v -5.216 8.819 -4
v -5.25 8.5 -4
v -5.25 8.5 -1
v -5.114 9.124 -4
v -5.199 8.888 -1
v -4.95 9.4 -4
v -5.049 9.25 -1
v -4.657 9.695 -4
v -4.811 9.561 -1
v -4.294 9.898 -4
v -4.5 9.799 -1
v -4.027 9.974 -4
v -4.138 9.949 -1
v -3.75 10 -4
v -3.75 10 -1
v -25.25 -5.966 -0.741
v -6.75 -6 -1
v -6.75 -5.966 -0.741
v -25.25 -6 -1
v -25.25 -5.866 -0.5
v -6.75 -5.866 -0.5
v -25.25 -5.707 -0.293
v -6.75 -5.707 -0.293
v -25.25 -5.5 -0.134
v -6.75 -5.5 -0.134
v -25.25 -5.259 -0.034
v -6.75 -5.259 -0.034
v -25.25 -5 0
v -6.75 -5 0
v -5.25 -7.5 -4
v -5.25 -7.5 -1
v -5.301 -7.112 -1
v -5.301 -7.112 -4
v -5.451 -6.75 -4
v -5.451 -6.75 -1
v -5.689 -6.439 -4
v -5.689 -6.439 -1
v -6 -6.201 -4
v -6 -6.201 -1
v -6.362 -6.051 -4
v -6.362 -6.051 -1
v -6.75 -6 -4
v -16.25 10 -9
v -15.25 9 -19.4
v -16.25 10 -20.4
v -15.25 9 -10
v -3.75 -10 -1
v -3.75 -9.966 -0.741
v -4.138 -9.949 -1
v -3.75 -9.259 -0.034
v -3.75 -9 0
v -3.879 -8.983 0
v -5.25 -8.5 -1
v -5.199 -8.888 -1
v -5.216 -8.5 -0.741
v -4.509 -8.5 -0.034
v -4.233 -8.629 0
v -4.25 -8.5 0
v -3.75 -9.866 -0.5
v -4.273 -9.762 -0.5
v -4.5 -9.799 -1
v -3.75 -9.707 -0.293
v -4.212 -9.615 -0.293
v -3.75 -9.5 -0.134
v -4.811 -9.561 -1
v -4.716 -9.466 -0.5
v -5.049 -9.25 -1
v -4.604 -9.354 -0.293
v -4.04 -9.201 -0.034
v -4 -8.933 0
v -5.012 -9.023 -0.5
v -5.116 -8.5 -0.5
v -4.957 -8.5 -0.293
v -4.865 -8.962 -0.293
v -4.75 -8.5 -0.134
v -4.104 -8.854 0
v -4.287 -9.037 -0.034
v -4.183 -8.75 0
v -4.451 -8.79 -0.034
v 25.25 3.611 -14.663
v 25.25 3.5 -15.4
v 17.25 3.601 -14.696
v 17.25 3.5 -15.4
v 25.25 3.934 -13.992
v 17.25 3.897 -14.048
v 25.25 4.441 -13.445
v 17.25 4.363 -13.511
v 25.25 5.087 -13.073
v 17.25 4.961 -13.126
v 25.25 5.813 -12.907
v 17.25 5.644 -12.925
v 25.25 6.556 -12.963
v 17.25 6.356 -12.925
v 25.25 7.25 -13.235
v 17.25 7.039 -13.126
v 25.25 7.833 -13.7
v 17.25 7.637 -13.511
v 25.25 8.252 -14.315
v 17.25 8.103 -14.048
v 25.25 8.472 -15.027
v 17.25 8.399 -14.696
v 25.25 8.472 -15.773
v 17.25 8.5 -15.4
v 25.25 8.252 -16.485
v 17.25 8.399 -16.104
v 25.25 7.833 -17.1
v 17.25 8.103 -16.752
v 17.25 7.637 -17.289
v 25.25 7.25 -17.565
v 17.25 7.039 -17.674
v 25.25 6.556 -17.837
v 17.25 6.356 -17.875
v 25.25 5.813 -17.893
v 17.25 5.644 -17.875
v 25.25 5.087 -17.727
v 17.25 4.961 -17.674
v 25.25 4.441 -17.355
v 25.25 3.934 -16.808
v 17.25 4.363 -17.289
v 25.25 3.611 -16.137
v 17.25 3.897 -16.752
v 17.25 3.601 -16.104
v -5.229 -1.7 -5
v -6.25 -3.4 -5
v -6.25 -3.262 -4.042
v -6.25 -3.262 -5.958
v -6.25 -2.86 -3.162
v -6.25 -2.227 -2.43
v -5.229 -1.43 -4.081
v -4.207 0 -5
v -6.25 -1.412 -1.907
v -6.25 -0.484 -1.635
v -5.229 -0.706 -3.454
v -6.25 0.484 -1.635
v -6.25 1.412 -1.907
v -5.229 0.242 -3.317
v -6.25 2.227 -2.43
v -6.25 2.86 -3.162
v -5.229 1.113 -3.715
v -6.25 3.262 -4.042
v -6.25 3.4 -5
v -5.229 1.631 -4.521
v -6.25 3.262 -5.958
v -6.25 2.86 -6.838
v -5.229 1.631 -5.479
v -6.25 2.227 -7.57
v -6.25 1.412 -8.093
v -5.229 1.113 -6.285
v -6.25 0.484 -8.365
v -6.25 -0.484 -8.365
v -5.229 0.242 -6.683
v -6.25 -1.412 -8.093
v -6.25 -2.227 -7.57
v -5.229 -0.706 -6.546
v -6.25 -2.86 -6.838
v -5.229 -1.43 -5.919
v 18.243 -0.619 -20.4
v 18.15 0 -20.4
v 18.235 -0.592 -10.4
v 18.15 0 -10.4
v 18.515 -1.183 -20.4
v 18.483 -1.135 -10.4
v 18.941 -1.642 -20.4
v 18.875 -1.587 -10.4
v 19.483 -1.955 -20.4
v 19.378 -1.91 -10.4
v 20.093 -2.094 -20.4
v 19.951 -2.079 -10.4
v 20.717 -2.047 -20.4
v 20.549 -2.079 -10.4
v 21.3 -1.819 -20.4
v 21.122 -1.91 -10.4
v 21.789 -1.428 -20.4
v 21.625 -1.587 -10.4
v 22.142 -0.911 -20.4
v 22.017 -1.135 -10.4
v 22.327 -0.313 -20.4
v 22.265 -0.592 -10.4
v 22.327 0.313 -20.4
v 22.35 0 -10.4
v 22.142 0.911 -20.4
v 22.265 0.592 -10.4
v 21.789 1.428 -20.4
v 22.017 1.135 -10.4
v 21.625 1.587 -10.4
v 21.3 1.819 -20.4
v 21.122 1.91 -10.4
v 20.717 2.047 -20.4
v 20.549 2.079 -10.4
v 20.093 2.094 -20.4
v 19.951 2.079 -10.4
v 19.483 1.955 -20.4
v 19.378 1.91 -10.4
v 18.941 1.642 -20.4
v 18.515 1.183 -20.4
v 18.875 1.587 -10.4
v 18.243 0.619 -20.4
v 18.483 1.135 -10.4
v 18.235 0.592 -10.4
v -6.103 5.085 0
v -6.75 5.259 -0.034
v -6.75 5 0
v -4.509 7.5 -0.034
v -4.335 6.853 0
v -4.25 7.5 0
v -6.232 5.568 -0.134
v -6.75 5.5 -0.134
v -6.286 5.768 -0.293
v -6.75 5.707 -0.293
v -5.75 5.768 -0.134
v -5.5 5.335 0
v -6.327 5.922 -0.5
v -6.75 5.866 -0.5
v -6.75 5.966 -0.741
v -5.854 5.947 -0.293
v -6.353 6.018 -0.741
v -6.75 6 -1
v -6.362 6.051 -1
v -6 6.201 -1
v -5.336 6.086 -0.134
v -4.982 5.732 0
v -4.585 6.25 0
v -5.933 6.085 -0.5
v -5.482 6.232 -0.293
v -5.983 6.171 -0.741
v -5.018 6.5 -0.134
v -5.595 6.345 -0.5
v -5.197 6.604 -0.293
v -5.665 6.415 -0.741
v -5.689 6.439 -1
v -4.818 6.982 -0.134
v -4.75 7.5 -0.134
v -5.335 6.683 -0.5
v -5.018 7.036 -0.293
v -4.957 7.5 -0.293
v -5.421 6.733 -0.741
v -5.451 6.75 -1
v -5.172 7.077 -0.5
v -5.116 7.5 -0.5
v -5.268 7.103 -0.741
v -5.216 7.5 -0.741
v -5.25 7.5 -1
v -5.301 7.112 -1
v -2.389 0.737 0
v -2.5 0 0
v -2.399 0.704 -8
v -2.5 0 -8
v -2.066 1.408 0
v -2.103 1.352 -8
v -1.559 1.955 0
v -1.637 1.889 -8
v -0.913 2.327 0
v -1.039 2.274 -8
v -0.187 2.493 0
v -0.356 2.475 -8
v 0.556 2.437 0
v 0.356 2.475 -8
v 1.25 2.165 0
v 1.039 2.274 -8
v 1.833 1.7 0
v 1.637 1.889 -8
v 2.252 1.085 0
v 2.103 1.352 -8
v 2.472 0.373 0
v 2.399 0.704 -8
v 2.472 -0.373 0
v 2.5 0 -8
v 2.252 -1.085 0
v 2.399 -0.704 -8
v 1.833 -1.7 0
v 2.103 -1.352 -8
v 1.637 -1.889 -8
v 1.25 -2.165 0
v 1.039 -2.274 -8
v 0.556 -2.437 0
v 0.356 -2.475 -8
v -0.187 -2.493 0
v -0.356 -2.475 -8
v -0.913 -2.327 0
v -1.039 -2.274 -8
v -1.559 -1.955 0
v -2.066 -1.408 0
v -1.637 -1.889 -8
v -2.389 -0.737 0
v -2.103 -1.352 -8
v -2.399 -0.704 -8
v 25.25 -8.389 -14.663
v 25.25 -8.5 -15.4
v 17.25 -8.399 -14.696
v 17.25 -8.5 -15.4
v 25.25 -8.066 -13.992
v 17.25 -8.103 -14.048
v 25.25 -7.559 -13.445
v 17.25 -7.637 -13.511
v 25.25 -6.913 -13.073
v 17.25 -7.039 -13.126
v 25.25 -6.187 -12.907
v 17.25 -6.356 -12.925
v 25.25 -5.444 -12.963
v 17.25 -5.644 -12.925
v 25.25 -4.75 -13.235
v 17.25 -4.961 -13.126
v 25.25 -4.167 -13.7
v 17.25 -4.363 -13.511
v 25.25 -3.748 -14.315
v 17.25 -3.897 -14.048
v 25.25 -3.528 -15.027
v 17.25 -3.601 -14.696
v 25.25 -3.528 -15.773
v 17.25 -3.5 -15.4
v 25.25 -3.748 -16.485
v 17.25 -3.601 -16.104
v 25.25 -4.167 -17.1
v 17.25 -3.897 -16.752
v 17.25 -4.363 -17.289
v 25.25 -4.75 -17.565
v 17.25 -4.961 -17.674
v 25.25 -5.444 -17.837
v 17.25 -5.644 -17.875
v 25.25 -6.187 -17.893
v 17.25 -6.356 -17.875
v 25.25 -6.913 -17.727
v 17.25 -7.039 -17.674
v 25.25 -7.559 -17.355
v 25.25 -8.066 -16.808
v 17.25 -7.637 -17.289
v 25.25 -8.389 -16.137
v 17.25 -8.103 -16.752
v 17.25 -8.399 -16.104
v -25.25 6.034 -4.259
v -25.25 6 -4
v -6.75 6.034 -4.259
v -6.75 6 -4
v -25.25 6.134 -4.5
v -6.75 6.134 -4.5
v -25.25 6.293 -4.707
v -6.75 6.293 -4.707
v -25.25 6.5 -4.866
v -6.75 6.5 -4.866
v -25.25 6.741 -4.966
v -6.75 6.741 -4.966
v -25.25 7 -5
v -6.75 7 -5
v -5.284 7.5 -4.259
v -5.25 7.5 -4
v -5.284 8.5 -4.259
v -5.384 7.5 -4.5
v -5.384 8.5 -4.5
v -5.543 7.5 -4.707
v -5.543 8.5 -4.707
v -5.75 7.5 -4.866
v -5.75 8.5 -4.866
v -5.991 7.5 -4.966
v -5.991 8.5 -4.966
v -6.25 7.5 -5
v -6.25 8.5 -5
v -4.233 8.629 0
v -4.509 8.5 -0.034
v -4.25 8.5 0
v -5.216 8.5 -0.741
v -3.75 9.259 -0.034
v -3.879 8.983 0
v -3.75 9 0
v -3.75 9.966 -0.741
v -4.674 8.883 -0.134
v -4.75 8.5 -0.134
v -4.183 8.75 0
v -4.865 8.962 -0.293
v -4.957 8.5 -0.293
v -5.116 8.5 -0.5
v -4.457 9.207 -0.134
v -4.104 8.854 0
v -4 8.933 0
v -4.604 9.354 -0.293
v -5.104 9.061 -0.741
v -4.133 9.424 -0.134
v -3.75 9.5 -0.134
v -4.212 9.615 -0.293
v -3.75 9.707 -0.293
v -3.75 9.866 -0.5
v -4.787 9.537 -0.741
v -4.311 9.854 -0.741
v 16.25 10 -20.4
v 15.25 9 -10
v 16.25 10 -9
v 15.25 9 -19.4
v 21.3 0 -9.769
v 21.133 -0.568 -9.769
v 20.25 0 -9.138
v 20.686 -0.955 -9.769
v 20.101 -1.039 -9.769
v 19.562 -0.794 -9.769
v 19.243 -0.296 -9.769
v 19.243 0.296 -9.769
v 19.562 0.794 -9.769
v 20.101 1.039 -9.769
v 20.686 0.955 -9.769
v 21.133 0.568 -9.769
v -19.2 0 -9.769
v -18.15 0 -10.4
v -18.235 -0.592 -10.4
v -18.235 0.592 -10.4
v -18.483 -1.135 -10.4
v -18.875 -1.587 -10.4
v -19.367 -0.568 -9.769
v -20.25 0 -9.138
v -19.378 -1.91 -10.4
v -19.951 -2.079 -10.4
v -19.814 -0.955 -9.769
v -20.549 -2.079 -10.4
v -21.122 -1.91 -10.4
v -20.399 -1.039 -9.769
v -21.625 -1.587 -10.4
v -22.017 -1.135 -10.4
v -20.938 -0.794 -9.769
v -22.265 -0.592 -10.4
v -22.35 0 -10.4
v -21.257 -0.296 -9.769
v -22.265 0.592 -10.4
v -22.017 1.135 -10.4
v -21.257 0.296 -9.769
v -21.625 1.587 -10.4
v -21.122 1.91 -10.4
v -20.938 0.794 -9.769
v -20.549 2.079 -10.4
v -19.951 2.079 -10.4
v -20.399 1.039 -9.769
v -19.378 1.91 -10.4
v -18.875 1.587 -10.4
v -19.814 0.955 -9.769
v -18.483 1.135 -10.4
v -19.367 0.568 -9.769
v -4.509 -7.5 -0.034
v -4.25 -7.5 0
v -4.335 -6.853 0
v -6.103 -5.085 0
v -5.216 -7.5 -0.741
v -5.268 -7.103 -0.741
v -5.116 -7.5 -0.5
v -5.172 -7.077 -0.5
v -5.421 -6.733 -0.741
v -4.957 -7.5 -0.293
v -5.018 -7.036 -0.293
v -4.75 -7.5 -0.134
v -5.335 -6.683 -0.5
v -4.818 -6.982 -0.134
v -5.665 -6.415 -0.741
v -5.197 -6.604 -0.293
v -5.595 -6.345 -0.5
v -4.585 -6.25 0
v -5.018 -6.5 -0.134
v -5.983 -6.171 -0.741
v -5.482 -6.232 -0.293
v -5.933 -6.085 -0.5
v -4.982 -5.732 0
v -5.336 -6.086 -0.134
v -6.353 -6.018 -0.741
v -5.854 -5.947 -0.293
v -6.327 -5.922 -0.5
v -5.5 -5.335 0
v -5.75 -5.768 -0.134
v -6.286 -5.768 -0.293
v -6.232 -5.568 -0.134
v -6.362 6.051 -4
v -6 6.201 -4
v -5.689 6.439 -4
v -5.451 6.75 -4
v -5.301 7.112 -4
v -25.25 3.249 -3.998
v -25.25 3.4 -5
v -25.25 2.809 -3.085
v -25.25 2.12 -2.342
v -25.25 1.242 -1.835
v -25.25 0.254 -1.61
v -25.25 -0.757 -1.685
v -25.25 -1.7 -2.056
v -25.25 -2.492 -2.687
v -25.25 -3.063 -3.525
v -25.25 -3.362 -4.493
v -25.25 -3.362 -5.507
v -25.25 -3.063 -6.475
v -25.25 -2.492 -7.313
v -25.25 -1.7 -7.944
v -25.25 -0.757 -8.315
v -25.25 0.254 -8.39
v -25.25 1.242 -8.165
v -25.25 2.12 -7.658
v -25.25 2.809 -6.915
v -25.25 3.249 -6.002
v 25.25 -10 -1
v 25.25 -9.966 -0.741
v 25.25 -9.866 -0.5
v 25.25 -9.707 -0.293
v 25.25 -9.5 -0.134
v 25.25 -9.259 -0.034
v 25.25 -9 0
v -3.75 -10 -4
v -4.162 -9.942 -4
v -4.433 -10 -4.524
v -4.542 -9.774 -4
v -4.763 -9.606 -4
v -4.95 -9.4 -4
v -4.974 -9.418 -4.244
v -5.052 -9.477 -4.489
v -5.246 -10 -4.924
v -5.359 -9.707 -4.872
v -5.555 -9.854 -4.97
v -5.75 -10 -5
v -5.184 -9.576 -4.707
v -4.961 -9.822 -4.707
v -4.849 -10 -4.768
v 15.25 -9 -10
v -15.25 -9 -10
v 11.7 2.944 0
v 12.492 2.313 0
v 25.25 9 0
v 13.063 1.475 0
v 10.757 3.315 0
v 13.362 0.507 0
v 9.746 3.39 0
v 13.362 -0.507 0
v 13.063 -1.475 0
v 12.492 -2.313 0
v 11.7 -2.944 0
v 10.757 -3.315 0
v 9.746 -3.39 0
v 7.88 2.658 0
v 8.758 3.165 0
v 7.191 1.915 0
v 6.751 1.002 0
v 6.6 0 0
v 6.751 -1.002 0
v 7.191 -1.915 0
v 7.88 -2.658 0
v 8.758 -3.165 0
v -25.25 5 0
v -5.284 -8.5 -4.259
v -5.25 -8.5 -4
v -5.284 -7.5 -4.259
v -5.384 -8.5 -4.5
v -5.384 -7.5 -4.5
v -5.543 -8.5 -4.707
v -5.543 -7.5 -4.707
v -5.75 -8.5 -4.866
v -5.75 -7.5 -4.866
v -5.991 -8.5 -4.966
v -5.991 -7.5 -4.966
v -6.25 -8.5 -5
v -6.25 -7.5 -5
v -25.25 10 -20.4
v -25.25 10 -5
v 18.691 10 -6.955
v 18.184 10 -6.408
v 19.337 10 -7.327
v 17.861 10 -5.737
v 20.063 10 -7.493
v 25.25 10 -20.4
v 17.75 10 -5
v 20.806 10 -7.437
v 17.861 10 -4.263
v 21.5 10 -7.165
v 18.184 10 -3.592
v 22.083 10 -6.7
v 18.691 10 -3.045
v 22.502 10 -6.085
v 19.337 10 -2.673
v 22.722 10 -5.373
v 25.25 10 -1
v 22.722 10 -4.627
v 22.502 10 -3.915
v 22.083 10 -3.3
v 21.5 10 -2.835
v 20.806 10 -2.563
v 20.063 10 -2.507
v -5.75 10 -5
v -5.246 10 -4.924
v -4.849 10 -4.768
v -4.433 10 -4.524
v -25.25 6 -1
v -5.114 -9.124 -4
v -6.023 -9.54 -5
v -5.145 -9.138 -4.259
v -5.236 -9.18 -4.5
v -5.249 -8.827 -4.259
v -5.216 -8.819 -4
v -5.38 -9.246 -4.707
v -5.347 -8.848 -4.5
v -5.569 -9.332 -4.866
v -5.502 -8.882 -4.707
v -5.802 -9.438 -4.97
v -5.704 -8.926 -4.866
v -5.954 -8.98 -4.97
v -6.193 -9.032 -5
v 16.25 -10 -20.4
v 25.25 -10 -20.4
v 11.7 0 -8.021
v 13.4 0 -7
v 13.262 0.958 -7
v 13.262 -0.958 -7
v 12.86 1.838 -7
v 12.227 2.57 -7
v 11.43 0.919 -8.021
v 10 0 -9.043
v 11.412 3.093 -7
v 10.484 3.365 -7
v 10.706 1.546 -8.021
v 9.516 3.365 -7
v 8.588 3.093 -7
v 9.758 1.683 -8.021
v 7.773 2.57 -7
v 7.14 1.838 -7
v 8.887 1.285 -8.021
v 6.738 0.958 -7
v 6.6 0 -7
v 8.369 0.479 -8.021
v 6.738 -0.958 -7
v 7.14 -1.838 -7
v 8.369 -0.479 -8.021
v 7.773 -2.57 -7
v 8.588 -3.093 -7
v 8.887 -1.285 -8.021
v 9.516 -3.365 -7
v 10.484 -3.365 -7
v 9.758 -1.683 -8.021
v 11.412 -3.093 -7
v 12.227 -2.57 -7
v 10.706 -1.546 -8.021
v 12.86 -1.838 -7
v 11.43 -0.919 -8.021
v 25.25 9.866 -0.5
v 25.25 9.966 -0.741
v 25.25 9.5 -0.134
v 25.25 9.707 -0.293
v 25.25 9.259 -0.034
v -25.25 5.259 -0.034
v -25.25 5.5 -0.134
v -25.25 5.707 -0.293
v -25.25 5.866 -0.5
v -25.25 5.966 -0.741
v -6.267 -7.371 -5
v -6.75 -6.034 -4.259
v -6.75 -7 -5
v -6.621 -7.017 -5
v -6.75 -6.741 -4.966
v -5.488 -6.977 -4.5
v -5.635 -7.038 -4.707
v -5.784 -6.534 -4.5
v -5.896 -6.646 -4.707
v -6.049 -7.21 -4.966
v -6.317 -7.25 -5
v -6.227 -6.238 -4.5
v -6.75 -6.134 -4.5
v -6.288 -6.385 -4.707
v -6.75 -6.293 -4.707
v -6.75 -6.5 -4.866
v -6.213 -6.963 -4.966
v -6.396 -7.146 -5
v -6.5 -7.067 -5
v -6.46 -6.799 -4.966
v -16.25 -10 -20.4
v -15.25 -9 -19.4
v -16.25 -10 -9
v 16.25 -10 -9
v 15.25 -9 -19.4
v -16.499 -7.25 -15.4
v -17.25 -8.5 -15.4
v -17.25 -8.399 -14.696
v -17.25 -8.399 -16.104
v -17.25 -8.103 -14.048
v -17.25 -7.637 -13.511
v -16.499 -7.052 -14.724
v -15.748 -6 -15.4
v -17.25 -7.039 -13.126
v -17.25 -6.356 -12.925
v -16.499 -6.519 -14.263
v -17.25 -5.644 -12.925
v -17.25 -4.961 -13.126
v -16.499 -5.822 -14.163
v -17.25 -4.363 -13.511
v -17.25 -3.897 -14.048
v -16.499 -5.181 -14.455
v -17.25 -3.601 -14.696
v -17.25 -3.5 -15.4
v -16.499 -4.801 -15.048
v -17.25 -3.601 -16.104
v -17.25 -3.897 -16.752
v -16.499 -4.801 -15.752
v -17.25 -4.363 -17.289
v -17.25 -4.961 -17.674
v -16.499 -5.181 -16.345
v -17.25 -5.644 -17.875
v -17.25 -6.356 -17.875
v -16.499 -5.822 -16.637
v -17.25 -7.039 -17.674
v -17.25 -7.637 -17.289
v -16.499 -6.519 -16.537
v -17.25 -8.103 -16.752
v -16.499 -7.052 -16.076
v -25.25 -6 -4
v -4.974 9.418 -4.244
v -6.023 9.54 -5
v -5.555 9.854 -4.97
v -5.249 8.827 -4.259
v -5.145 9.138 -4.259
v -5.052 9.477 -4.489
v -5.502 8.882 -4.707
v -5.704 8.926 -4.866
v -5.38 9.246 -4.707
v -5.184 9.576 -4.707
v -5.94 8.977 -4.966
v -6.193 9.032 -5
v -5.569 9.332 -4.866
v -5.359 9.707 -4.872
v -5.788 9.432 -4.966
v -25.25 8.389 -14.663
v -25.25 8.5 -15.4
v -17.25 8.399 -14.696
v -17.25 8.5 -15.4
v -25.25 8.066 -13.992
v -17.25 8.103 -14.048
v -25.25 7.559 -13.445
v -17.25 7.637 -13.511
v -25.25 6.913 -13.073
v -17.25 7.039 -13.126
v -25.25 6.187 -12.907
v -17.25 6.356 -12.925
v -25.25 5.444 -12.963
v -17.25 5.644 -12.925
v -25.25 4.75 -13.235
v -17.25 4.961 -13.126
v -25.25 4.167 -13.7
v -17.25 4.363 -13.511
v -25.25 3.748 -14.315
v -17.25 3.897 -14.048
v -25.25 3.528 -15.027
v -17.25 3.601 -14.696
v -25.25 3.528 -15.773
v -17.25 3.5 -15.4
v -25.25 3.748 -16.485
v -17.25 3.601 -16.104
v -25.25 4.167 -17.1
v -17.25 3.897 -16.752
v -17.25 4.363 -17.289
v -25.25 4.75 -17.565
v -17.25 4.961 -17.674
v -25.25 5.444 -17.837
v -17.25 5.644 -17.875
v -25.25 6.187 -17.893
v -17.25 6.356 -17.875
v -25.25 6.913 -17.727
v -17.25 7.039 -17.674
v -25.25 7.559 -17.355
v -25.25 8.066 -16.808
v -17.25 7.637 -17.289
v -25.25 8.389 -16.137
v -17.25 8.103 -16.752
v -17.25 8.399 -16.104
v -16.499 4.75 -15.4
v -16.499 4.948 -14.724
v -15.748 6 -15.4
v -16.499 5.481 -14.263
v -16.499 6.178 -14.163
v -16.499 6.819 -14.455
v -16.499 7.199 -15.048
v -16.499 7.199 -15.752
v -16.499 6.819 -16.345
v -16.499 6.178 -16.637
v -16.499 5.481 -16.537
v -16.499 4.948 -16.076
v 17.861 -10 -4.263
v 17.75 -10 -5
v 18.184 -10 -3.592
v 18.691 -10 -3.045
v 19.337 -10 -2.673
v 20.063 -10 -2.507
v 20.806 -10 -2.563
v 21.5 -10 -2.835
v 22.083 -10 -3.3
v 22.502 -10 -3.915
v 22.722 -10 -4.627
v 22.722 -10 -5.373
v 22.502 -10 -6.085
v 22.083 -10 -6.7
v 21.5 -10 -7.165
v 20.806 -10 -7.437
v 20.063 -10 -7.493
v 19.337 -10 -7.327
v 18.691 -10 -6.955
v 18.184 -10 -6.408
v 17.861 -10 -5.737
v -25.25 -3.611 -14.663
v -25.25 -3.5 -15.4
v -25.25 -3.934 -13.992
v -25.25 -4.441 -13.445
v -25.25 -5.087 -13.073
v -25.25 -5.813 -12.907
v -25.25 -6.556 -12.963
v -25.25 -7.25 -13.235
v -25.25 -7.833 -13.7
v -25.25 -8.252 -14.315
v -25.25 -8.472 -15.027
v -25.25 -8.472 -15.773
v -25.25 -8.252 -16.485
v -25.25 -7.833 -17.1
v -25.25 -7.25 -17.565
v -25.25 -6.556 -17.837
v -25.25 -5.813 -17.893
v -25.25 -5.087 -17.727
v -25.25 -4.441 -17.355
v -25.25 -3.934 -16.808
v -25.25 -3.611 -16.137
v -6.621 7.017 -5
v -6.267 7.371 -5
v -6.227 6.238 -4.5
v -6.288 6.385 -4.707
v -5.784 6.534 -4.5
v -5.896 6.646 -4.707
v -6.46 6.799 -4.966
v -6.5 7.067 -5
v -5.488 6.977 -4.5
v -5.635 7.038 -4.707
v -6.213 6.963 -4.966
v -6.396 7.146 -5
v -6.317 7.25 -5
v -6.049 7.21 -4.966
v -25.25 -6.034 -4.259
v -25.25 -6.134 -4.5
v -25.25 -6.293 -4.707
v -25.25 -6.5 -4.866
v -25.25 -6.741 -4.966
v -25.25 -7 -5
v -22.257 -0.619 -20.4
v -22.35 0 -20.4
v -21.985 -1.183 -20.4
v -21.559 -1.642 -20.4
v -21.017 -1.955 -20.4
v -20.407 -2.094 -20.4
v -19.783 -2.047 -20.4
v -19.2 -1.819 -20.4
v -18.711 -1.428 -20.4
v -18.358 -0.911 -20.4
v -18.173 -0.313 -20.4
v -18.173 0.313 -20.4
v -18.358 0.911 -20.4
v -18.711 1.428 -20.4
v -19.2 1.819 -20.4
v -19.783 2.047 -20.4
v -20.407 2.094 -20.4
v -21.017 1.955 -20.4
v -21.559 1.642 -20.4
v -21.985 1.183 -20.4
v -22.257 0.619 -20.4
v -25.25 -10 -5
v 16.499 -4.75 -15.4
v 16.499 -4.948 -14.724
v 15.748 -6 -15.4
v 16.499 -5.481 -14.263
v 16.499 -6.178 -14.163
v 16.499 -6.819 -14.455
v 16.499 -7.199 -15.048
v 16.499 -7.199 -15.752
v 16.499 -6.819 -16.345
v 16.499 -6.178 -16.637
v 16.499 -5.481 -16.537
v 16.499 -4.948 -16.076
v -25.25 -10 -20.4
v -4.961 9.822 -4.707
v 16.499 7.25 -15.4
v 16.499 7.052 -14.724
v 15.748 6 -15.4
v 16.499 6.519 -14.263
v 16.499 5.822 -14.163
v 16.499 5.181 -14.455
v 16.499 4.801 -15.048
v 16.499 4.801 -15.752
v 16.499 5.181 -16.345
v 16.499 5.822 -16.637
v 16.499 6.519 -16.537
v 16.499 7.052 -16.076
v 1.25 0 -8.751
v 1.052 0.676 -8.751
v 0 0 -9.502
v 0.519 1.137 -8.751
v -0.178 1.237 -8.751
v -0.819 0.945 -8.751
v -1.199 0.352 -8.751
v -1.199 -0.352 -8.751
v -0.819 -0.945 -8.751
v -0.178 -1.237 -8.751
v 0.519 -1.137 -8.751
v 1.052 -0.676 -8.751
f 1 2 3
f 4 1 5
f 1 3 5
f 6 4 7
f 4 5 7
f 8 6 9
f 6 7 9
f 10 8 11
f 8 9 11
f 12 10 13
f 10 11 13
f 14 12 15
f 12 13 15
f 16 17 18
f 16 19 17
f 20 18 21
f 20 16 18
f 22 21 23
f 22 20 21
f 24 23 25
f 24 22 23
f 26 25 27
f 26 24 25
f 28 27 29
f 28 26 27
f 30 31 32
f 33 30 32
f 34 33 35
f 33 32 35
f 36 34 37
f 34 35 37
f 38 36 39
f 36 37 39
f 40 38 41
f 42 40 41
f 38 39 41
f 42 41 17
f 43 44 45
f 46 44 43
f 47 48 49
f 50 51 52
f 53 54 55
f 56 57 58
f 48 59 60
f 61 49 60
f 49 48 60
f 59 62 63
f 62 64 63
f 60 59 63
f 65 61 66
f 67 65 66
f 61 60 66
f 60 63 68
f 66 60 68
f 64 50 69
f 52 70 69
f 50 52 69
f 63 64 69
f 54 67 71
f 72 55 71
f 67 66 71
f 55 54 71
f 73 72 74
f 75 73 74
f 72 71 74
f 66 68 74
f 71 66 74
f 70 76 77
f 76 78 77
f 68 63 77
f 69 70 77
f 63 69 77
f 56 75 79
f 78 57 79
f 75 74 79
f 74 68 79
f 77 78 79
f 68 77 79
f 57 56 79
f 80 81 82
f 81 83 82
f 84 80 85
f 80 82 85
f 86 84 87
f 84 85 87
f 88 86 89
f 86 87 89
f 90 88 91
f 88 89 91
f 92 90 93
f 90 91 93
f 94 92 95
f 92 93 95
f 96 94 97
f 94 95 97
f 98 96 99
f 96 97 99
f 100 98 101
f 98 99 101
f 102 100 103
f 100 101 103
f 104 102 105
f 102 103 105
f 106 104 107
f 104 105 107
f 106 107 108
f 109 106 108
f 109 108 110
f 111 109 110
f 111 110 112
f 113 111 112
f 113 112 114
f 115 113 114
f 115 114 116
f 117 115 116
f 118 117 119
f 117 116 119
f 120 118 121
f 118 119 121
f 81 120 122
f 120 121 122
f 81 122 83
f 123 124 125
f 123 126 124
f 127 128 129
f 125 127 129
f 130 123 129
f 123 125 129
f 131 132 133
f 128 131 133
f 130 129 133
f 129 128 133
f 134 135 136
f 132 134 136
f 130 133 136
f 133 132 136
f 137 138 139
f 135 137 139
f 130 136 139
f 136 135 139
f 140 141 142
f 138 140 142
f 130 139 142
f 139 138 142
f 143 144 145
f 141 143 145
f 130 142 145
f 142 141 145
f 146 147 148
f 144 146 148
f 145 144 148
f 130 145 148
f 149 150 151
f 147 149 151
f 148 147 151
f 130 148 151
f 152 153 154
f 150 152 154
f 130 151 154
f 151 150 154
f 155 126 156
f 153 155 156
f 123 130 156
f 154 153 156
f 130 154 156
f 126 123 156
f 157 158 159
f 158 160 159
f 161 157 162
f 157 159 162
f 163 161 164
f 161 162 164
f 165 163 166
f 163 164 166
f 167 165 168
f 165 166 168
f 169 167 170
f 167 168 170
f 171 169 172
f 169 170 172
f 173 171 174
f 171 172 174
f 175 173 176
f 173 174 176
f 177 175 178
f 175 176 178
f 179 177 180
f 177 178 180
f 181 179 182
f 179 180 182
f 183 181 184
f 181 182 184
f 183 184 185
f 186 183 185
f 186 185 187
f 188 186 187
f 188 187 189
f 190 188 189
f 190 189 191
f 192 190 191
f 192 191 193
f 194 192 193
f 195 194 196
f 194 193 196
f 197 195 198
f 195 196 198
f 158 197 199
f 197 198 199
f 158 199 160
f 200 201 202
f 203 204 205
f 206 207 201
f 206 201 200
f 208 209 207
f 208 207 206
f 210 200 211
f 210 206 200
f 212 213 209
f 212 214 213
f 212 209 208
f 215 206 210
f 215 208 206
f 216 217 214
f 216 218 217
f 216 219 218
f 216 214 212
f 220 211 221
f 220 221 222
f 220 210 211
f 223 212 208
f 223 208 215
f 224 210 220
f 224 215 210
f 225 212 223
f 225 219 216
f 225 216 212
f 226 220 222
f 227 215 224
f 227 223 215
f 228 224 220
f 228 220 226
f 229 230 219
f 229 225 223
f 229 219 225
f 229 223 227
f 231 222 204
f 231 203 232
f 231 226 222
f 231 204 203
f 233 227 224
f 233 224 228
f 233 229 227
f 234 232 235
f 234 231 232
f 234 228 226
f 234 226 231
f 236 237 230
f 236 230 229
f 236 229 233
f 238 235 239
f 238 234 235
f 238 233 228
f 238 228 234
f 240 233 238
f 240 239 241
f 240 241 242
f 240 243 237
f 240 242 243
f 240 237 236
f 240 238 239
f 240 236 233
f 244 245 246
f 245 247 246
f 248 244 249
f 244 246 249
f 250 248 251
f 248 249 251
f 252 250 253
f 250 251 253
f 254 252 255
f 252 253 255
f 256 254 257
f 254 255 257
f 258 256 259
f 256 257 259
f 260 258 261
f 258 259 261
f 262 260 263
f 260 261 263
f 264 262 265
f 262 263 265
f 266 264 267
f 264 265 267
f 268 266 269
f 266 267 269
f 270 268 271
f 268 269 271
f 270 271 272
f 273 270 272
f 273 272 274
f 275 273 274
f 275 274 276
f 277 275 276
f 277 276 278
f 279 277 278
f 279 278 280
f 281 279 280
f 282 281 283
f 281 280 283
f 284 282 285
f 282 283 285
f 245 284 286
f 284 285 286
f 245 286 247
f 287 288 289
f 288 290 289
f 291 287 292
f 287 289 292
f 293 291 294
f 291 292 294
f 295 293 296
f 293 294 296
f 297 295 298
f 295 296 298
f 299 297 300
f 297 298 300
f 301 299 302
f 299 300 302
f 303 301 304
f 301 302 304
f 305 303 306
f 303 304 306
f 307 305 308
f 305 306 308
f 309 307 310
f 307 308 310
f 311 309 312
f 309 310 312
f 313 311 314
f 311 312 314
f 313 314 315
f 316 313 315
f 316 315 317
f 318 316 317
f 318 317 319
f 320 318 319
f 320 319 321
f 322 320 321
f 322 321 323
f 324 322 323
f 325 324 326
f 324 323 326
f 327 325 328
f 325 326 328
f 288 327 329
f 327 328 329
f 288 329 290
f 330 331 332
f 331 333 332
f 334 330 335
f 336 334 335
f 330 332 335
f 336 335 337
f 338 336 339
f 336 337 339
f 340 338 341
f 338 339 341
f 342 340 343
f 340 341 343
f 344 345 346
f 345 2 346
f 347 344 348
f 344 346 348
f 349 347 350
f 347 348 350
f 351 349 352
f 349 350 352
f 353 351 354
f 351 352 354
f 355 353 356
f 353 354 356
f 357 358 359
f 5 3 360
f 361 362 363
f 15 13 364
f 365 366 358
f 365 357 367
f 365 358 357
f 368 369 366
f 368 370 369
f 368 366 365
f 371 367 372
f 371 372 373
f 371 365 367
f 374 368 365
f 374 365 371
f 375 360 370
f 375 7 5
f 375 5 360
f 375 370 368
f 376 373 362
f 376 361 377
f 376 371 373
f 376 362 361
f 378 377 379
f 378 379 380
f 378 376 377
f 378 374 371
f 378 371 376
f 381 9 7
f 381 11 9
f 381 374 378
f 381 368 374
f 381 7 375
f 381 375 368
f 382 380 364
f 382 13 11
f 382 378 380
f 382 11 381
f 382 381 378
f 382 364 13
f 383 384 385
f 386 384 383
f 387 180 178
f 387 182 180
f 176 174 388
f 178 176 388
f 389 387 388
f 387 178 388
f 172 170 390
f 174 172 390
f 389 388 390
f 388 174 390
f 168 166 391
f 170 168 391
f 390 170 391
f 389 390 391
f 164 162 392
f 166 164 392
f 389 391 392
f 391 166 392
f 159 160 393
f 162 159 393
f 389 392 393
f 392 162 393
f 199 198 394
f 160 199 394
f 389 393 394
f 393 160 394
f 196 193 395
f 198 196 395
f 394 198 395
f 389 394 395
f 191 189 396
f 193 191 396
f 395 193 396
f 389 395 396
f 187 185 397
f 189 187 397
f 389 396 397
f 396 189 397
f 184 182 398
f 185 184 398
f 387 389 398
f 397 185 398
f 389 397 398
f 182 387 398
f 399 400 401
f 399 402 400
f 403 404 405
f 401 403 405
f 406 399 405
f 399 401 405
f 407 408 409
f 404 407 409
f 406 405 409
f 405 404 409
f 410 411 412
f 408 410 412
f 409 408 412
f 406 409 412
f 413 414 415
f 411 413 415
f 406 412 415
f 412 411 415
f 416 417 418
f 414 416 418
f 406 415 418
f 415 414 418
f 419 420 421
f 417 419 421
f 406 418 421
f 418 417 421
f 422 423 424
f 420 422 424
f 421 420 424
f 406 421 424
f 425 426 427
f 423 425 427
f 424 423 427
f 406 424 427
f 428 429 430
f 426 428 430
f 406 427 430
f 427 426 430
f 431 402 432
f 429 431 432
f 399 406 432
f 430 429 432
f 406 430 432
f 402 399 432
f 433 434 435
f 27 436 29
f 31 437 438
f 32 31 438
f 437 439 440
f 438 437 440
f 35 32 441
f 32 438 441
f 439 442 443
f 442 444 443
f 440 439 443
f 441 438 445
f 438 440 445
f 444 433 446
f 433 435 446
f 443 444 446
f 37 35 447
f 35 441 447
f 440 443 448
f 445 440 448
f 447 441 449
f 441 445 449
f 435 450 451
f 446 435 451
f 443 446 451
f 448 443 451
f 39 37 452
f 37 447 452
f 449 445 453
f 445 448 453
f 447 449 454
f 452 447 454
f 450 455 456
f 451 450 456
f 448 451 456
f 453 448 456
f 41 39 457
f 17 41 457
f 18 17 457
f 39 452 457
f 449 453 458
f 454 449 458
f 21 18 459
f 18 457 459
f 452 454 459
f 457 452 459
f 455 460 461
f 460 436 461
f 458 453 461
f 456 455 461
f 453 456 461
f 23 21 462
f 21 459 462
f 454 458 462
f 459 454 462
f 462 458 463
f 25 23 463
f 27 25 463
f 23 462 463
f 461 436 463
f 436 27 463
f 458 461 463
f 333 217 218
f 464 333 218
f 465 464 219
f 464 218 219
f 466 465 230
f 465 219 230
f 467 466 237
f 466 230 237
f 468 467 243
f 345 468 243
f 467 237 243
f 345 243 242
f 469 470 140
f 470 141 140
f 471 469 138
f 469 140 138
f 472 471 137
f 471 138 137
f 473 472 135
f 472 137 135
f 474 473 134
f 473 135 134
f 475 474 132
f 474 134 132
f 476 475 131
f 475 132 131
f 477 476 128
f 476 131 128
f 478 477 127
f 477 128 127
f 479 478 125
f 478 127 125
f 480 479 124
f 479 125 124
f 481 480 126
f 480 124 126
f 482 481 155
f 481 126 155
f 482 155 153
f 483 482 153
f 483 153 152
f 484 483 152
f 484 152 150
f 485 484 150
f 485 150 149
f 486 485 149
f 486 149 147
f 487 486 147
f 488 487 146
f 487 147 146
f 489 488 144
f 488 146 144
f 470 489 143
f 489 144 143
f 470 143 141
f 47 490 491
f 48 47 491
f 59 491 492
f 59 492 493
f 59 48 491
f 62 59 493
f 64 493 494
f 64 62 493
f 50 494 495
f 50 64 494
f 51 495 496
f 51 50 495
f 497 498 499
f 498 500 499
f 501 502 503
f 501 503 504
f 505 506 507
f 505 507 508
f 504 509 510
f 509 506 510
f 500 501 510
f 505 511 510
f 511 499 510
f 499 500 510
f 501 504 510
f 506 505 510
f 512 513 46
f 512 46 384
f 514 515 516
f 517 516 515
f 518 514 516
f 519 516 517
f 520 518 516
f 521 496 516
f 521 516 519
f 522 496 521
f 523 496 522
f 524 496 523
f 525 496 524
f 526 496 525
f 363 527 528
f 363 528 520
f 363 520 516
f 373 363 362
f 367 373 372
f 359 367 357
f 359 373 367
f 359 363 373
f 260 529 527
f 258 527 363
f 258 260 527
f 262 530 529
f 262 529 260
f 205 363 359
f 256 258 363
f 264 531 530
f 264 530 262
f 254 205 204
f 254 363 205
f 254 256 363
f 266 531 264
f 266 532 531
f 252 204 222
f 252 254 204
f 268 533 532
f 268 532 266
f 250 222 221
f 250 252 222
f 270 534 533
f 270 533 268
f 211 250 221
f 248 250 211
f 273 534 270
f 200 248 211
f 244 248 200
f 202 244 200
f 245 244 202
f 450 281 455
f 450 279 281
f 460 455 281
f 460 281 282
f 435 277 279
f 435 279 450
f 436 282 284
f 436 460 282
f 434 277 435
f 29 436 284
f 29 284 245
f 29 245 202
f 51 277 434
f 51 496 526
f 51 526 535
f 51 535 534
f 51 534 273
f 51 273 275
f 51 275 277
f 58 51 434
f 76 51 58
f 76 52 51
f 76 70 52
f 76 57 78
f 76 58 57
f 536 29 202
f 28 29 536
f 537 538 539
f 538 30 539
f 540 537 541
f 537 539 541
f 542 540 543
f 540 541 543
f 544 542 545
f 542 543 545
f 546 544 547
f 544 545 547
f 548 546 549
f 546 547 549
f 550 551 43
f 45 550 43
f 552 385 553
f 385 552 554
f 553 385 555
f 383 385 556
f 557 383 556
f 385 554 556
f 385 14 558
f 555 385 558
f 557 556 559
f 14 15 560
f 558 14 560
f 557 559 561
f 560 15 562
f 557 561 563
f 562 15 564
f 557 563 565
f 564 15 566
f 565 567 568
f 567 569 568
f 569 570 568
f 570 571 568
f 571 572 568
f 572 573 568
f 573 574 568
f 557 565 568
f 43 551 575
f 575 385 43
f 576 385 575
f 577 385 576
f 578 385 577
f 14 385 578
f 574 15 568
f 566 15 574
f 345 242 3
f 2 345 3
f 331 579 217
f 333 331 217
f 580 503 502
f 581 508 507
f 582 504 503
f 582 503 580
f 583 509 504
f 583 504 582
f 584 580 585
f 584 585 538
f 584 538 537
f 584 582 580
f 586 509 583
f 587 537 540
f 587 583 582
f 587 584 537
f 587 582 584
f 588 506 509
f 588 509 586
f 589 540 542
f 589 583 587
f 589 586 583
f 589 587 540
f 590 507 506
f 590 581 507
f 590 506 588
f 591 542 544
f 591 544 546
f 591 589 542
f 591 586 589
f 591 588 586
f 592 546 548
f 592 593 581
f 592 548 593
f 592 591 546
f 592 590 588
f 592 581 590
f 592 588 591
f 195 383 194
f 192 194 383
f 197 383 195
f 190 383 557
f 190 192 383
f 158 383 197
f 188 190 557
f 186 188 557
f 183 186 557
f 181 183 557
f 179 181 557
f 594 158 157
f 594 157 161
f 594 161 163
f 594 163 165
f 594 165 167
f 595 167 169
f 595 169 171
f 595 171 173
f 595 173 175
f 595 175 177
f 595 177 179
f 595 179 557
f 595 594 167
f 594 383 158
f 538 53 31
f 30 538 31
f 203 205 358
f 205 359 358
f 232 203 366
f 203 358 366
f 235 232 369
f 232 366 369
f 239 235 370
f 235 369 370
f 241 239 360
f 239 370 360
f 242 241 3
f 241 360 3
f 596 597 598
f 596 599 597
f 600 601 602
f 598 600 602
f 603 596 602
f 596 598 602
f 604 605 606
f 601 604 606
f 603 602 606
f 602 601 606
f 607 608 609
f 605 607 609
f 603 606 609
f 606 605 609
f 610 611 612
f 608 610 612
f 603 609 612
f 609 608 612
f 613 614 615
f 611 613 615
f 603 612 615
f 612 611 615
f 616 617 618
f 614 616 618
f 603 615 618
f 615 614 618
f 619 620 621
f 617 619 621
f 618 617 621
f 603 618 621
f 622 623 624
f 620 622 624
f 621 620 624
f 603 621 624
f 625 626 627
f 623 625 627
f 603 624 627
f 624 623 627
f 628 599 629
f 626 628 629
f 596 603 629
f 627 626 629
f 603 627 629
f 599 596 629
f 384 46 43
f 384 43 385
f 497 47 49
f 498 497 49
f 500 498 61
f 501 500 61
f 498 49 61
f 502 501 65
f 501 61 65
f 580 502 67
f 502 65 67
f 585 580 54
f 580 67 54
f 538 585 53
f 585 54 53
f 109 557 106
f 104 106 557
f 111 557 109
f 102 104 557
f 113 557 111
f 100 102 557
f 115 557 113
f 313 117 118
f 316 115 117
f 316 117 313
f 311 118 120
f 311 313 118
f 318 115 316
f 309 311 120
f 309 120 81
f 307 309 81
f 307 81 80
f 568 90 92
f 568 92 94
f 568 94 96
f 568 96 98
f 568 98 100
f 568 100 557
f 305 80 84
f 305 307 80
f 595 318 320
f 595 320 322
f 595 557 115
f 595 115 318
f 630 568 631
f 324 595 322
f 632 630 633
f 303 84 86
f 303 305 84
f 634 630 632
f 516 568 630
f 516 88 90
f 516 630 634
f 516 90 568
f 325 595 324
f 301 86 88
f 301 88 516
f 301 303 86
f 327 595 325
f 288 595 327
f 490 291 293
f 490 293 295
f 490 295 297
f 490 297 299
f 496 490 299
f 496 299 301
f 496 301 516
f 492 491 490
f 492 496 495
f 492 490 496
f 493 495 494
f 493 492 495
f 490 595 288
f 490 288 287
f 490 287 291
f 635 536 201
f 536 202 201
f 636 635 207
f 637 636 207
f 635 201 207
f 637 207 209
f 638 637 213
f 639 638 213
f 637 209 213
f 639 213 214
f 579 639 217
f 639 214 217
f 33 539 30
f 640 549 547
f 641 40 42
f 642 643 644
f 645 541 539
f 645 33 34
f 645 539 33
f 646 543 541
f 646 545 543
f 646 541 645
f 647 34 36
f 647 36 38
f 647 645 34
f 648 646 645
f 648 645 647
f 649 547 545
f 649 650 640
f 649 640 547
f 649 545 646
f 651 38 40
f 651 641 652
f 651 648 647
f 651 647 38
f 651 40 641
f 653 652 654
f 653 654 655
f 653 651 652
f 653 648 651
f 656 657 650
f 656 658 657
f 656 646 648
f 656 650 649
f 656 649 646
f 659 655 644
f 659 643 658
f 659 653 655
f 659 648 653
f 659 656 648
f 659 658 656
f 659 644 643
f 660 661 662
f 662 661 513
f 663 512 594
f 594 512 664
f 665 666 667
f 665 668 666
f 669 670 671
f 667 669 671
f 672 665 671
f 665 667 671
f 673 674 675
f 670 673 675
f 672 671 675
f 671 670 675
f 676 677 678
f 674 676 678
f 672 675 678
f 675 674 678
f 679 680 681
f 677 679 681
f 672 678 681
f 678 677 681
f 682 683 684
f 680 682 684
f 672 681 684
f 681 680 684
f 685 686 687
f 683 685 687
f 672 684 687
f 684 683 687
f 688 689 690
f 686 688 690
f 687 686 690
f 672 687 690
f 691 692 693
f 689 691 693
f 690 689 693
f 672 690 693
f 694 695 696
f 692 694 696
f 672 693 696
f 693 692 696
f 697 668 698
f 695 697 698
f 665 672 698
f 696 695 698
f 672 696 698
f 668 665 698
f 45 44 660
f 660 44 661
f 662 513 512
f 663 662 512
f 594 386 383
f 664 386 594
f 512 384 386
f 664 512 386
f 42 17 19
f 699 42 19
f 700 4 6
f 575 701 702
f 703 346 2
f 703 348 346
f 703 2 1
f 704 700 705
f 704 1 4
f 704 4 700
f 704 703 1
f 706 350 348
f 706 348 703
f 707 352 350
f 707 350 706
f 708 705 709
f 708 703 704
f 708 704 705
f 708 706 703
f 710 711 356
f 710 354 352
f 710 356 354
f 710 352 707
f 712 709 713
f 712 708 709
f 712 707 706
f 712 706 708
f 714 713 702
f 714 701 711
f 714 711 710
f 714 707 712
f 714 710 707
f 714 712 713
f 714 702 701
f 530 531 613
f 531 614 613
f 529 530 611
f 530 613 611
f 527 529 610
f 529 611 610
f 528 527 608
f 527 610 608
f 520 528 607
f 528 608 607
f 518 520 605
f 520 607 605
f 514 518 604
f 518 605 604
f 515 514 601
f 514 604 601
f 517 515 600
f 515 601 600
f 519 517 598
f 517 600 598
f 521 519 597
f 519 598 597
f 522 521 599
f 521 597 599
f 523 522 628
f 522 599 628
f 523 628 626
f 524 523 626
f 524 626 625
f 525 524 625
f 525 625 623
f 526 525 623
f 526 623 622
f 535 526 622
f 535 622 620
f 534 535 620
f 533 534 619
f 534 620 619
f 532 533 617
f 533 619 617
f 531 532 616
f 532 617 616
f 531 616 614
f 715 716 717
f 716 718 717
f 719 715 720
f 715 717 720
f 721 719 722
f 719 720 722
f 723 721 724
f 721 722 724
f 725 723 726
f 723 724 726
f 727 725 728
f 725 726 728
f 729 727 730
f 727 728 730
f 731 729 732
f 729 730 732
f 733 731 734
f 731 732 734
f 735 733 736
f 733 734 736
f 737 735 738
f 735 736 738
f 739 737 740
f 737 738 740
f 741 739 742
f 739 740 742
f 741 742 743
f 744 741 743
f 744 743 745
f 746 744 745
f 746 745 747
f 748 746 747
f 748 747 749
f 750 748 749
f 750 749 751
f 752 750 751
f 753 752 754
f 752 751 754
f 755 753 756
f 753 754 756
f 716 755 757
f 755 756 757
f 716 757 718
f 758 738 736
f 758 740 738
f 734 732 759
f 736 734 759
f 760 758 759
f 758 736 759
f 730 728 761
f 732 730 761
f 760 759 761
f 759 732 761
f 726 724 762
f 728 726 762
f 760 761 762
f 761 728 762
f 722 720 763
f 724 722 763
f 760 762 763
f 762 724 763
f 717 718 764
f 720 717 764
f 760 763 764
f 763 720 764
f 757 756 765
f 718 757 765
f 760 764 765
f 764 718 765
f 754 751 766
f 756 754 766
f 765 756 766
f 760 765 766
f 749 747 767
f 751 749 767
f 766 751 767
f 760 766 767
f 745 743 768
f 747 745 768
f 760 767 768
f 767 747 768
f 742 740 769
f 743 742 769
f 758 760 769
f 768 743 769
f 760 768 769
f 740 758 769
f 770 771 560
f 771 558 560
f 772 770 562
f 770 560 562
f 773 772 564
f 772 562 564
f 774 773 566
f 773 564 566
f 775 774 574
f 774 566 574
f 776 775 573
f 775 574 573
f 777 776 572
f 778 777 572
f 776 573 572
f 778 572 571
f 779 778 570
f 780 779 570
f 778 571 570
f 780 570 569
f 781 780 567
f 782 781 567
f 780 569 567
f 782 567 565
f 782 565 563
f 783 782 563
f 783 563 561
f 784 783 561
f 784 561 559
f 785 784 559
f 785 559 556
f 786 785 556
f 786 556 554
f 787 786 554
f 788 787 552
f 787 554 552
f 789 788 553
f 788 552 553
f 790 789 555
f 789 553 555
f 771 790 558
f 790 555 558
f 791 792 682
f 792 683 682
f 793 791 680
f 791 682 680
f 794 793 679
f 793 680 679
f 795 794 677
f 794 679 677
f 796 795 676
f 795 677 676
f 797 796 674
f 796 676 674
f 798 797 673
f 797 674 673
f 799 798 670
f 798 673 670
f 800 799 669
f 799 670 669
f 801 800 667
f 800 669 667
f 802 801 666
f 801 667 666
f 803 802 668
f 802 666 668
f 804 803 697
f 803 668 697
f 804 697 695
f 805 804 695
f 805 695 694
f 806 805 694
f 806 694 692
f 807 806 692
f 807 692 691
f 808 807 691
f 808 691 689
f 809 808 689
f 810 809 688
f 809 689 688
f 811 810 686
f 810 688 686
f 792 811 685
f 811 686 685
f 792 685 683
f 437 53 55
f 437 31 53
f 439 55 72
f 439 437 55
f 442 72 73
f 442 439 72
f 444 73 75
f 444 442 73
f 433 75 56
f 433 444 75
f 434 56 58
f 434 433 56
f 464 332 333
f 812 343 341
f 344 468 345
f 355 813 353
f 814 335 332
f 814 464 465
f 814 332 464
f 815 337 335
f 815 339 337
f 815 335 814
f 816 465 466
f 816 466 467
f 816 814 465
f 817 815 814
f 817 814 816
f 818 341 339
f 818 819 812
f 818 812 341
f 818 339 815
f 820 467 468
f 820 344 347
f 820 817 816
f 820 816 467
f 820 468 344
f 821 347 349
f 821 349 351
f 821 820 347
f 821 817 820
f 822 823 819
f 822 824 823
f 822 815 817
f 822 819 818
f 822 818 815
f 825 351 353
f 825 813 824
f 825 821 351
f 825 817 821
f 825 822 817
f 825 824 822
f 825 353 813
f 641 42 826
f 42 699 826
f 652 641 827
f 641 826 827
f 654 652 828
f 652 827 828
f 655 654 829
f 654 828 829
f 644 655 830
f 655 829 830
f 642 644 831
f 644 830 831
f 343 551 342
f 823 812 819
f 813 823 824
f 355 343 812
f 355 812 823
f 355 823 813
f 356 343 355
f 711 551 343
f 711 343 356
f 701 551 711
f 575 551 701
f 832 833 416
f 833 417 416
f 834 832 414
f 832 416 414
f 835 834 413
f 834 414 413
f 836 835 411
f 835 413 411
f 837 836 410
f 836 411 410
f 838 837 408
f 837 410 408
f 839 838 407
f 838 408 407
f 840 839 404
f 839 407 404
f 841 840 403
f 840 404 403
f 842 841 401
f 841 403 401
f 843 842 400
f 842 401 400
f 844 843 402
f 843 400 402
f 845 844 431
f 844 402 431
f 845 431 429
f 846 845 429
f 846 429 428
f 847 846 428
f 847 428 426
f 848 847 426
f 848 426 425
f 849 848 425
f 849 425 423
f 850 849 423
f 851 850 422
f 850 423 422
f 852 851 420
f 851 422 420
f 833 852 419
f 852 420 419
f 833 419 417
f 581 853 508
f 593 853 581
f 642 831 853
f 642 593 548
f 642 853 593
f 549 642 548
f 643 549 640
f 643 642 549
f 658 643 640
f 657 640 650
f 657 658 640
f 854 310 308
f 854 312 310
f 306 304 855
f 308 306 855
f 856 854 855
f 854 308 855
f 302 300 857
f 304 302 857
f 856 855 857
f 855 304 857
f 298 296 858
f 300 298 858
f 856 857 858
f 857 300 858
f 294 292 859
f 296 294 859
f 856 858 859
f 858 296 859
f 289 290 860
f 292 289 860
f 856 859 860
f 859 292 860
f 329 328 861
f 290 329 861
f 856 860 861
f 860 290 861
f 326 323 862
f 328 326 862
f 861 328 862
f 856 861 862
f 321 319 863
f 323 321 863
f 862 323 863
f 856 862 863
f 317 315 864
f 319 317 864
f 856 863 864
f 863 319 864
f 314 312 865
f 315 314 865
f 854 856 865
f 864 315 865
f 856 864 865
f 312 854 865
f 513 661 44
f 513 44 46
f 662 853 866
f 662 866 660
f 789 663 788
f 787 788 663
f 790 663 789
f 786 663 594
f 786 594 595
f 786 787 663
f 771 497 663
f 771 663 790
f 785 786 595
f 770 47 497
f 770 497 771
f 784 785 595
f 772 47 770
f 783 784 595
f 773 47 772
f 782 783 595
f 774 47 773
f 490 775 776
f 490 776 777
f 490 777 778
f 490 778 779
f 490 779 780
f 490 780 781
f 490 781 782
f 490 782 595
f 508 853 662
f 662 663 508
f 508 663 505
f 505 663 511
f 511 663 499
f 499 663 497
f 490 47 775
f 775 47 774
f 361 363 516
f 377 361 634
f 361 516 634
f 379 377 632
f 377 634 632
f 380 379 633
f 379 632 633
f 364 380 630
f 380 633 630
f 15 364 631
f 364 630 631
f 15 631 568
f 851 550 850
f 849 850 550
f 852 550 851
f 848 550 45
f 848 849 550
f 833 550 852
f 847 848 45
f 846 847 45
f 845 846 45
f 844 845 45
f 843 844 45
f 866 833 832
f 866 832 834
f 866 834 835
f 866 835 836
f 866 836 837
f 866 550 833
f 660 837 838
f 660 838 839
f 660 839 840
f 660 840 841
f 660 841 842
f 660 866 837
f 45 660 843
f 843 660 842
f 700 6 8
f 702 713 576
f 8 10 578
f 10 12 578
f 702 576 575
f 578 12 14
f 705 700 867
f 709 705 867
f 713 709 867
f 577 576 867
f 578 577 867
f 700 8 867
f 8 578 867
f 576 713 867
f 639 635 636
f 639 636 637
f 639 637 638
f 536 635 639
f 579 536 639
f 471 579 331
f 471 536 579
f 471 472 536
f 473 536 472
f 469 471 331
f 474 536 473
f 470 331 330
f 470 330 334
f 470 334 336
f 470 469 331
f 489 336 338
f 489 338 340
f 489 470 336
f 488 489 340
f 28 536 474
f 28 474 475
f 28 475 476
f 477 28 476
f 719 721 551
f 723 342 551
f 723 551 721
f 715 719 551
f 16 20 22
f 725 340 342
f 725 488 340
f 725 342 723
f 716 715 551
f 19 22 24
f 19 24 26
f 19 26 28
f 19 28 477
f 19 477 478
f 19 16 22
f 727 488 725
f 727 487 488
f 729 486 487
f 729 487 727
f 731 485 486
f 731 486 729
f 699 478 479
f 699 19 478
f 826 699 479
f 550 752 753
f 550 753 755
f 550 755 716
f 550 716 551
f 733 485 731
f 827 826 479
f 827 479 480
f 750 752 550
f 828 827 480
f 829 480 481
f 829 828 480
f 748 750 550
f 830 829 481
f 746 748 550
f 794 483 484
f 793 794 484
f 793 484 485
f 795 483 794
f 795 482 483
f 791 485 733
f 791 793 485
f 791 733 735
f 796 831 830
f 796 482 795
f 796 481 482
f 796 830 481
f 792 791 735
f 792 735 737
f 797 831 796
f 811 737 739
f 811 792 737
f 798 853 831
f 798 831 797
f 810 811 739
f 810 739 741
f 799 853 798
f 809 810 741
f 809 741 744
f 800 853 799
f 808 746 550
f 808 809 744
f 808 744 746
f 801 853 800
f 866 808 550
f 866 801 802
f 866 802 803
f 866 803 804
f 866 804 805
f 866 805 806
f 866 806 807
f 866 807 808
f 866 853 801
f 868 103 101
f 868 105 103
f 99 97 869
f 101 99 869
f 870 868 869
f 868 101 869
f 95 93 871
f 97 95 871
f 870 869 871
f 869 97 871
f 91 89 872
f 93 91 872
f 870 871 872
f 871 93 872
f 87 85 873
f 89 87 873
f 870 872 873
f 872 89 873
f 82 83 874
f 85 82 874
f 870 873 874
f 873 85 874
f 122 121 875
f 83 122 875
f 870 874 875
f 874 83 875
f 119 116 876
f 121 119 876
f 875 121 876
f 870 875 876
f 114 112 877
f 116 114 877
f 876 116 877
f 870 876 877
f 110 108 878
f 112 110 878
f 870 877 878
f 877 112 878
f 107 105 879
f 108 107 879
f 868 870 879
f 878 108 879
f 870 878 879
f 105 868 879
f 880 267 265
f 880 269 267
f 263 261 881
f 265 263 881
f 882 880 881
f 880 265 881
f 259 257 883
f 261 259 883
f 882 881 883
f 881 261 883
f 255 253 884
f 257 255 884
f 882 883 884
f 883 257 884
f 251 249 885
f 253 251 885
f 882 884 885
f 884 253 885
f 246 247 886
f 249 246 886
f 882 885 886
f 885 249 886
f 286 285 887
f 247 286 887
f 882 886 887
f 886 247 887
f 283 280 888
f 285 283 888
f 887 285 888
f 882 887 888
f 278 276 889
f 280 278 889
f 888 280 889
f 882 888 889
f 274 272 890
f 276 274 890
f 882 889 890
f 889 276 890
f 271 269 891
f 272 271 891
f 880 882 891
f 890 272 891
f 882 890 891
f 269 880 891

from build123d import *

# Parameters (mm, degrees)
F1_DEPTH       = 10
F5_D           = 5
F5_DEPTH       = 8
F5_TIP         = 1.5021515476
F5_ON_F4_D     = 5
F5_ON_F4_DEPTH = 8
F5_ON_F4_TIP   = 1.5021515476
F6_D           = 6.8
F6_DEPTH       = 19
F6_TIP         = 2.0429261047
F8_D           = 4.2
F8_DEPTH       = 10
F8_TIP         = 1.2618073
F10_D          = 5
F10_DEPTH      = 20
F10_TIP        = 1.5021515476
F13_D          = 6.8
F13_DEPTH      = 7
F13_TIP        = 2.0429261047
F14_D          = 5
F14_DEPTH      = 8
F14_TIP        = 1.5021515476
F16_DEPTH      = 5
F17_SIZE       = 1
F18_F1_R       = 1
F18_F2_R       = 1
F18_F3_R       = 1
F18_F4_R       = 1


# Not quite as in the source:
# - a feature names something its author has since deleted; it is built from what else it names


with BuildPart() as f1:
    # F0 (on Front) → F1 (new body, symmetric)
    with BuildSketch(Plane.XZ):
        Polygon((-25.25, 0), (-25.25, -20.4), (-15.25, -20.4), (-15.25, -10), (15.25, -10), (15.25, -20.4), (25.25, -20.4), (25.25, 0), align=None)
    extrude(amount=F1_DEPTH, both=True)

    # F5
    with Locations(Plane(origin=(-25.25, 0, 0), x_dir=(0, -1, 0), z_dir=(-1, 0, 0))):
        with Locations((6, -15.4), (-6, -15.4)):
            Hole(F5_D / 2, depth=F5_DEPTH)
            with Locations((0, 0, -(F5_DEPTH + F5_TIP / 2))):  # 118° drill point
                Cone(0, F5_D / 2, F5_TIP, mode=Mode.SUBTRACT)

    # F5 on F4
    with Locations(Plane.YZ.offset(25.25)):
        with Locations((-6, -15.4), (6, -15.4)):
            Hole(F5_ON_F4_D / 2, depth=F5_ON_F4_DEPTH)
            with Locations((0, 0, -(F5_ON_F4_DEPTH + F5_ON_F4_TIP / 2))):  # 118° drill point
                Cone(0, F5_ON_F4_D / 2, F5_ON_F4_TIP, mode=Mode.SUBTRACT)

    # F6
    with Locations(Plane(origin=(-25.25, 0, 0), x_dir=(0, -1, 0), z_dir=(-1, 0, 0))):
        with Locations((0, -5)):
            Hole(F6_D / 2, depth=F6_DEPTH)
            with Locations((0, 0, -(F6_DEPTH + F6_TIP / 2))):  # 118° drill point
                Cone(0, F6_D / 2, F6_TIP, mode=Mode.SUBTRACT)

    # F8
    with Locations(Plane(origin=(0, 0, -20.4), x_dir=(1, 0, 0), z_dir=(0, 0, -1))):
        with Locations((-20.25, 0), (20.25, 0)):
            Hole(F8_D / 2, depth=F8_DEPTH)
            with Locations((0, 0, -(F8_DEPTH + F8_TIP / 2))):  # 118° drill point
                Cone(0, F8_D / 2, F8_TIP, mode=Mode.SUBTRACT)

    # F10
    with Locations(Plane.XZ.offset(10)):
        with Locations((20.25, -5)):
            Hole(F10_D / 2, depth=F10_DEPTH)
            with Locations((0, 0, -(F10_DEPTH + F10_TIP / 2))):  # 118° drill point
                Cone(0, F10_D / 2, F10_TIP, mode=Mode.SUBTRACT)

    # F13
    with Locations(Plane.XY):
        with Locations((10, 0)):
            Hole(F13_D / 2, depth=F13_DEPTH)
            with Locations((0, 0, -(F13_DEPTH + F13_TIP / 2))):  # 118° drill point
                Cone(0, F13_D / 2, F13_TIP, mode=Mode.SUBTRACT)

    # F14
    with Locations(Plane.XY):
        with Locations((0, 0)):
            Hole(F14_D / 2, depth=F14_DEPTH)
            with Locations((0, 0, -(F14_DEPTH + F14_TIP / 2))):  # 118° drill point
                Cone(0, F14_D / 2, F14_TIP, mode=Mode.SUBTRACT)

    # F15 (on face) → F16 (cut)
    with BuildSketch(Plane.XY):
        with BuildLine():
            Line((-6.75, -6), (-25.25, -6))
            Line((-25.25, -6), (-25.25, -10))
            Line((-25.25, -10), (-3.75, -10))
            ThreePointArc((-3.75, -10), (-4.8106601718, -9.5606601718), (-5.25, -8.5))
            Line((-5.25, -8.5), (-5.25, -7.5))
            ThreePointArc((-5.25, -7.5), (-5.6893398282, -6.4393398282), (-6.75, -6))
        make_face()
        with BuildLine():
            Line((-25.25, 10), (-25.25, 6))
            Line((-25.25, 6), (-6.75, 6))
            ThreePointArc((-6.75, 6), (-5.6893398282, 6.4393398282), (-5.25, 7.5))
            Line((-5.25, 7.5), (-5.25, 8.5))
            ThreePointArc((-5.25, 8.5), (-4.8106601718, 9.5606601718), (-3.75, 10))
            Line((-3.75, 10), (-25.25, 10))
        make_face()
    extrude(amount=-F16_DEPTH, mode=Mode.SUBTRACT)

    # F17
    f17_edges = [f1.edges().sort_by_distance(p)[0] for p in [
        (15.25, 0, -20.4),
        (-15.25, 0, -20.4),
        (-15.25, -10, -15.2),
        (0, -10, -10),
        (15.25, -10, -15.2),
        (0, 10, -10),
        (-15.25, 10, -15.2),
        (15.25, 10, -15.2),
    ]]
    chamfer(f17_edges, length=F17_SIZE)

    # F18: fillet of radius 1 on 16 edges, made by hand

    # F18_f1
    f18_f1_edges = [f1.edges().sort_by_distance(p)[0] for p in [
        (10.75, -10, 0),
        (-4.8106601718, -9.5606601718, 0),
        (-5.25, -8, 0),
        (-5.6893398282, -6.4393398282, 0),
        (-16, -6, 0),
    ]]
    fillet(f18_f1_edges, radius=F18_F1_R)

    # F18_f2
    f18_f2_edges = [f1.edges().sort_by_distance(p)[0] for p in [
        (-16, 6, 0),
        (-5.6893398282, 6.4393398282, 0),
        (-5.25, 8, 0),
        (-4.8106601718, 9.5606601718, 0),
        (10.75, 10, 0),
    ]]
    fillet(f18_f2_edges, radius=F18_F2_R)

    # F18_f3
    f18_f3_edges = [f1.edges().sort_by_distance(p)[0] for p in [
        (-4.8106601718, -9.5606601718, -5),
        (-16, -6, -5),
        (-5.25, -8, -5),
        (-5.6893398282, -6.4393398282, -5),
    ]]
    fillet(f18_f3_edges, radius=F18_F3_R)

    # F18_f4
    f18_f4_edges = [f1.edges().sort_by_distance(p)[0] for p in [
        (-16, 6, -5),
        (-5.6893398282, 6.4393398282, -5),
        (-5.25, 8, -5),
        (-4.8106601718, 9.5606601718, -5),
    ]]
    fillet(f18_f4_edges, radius=F18_F4_R)


solid = f1.part
